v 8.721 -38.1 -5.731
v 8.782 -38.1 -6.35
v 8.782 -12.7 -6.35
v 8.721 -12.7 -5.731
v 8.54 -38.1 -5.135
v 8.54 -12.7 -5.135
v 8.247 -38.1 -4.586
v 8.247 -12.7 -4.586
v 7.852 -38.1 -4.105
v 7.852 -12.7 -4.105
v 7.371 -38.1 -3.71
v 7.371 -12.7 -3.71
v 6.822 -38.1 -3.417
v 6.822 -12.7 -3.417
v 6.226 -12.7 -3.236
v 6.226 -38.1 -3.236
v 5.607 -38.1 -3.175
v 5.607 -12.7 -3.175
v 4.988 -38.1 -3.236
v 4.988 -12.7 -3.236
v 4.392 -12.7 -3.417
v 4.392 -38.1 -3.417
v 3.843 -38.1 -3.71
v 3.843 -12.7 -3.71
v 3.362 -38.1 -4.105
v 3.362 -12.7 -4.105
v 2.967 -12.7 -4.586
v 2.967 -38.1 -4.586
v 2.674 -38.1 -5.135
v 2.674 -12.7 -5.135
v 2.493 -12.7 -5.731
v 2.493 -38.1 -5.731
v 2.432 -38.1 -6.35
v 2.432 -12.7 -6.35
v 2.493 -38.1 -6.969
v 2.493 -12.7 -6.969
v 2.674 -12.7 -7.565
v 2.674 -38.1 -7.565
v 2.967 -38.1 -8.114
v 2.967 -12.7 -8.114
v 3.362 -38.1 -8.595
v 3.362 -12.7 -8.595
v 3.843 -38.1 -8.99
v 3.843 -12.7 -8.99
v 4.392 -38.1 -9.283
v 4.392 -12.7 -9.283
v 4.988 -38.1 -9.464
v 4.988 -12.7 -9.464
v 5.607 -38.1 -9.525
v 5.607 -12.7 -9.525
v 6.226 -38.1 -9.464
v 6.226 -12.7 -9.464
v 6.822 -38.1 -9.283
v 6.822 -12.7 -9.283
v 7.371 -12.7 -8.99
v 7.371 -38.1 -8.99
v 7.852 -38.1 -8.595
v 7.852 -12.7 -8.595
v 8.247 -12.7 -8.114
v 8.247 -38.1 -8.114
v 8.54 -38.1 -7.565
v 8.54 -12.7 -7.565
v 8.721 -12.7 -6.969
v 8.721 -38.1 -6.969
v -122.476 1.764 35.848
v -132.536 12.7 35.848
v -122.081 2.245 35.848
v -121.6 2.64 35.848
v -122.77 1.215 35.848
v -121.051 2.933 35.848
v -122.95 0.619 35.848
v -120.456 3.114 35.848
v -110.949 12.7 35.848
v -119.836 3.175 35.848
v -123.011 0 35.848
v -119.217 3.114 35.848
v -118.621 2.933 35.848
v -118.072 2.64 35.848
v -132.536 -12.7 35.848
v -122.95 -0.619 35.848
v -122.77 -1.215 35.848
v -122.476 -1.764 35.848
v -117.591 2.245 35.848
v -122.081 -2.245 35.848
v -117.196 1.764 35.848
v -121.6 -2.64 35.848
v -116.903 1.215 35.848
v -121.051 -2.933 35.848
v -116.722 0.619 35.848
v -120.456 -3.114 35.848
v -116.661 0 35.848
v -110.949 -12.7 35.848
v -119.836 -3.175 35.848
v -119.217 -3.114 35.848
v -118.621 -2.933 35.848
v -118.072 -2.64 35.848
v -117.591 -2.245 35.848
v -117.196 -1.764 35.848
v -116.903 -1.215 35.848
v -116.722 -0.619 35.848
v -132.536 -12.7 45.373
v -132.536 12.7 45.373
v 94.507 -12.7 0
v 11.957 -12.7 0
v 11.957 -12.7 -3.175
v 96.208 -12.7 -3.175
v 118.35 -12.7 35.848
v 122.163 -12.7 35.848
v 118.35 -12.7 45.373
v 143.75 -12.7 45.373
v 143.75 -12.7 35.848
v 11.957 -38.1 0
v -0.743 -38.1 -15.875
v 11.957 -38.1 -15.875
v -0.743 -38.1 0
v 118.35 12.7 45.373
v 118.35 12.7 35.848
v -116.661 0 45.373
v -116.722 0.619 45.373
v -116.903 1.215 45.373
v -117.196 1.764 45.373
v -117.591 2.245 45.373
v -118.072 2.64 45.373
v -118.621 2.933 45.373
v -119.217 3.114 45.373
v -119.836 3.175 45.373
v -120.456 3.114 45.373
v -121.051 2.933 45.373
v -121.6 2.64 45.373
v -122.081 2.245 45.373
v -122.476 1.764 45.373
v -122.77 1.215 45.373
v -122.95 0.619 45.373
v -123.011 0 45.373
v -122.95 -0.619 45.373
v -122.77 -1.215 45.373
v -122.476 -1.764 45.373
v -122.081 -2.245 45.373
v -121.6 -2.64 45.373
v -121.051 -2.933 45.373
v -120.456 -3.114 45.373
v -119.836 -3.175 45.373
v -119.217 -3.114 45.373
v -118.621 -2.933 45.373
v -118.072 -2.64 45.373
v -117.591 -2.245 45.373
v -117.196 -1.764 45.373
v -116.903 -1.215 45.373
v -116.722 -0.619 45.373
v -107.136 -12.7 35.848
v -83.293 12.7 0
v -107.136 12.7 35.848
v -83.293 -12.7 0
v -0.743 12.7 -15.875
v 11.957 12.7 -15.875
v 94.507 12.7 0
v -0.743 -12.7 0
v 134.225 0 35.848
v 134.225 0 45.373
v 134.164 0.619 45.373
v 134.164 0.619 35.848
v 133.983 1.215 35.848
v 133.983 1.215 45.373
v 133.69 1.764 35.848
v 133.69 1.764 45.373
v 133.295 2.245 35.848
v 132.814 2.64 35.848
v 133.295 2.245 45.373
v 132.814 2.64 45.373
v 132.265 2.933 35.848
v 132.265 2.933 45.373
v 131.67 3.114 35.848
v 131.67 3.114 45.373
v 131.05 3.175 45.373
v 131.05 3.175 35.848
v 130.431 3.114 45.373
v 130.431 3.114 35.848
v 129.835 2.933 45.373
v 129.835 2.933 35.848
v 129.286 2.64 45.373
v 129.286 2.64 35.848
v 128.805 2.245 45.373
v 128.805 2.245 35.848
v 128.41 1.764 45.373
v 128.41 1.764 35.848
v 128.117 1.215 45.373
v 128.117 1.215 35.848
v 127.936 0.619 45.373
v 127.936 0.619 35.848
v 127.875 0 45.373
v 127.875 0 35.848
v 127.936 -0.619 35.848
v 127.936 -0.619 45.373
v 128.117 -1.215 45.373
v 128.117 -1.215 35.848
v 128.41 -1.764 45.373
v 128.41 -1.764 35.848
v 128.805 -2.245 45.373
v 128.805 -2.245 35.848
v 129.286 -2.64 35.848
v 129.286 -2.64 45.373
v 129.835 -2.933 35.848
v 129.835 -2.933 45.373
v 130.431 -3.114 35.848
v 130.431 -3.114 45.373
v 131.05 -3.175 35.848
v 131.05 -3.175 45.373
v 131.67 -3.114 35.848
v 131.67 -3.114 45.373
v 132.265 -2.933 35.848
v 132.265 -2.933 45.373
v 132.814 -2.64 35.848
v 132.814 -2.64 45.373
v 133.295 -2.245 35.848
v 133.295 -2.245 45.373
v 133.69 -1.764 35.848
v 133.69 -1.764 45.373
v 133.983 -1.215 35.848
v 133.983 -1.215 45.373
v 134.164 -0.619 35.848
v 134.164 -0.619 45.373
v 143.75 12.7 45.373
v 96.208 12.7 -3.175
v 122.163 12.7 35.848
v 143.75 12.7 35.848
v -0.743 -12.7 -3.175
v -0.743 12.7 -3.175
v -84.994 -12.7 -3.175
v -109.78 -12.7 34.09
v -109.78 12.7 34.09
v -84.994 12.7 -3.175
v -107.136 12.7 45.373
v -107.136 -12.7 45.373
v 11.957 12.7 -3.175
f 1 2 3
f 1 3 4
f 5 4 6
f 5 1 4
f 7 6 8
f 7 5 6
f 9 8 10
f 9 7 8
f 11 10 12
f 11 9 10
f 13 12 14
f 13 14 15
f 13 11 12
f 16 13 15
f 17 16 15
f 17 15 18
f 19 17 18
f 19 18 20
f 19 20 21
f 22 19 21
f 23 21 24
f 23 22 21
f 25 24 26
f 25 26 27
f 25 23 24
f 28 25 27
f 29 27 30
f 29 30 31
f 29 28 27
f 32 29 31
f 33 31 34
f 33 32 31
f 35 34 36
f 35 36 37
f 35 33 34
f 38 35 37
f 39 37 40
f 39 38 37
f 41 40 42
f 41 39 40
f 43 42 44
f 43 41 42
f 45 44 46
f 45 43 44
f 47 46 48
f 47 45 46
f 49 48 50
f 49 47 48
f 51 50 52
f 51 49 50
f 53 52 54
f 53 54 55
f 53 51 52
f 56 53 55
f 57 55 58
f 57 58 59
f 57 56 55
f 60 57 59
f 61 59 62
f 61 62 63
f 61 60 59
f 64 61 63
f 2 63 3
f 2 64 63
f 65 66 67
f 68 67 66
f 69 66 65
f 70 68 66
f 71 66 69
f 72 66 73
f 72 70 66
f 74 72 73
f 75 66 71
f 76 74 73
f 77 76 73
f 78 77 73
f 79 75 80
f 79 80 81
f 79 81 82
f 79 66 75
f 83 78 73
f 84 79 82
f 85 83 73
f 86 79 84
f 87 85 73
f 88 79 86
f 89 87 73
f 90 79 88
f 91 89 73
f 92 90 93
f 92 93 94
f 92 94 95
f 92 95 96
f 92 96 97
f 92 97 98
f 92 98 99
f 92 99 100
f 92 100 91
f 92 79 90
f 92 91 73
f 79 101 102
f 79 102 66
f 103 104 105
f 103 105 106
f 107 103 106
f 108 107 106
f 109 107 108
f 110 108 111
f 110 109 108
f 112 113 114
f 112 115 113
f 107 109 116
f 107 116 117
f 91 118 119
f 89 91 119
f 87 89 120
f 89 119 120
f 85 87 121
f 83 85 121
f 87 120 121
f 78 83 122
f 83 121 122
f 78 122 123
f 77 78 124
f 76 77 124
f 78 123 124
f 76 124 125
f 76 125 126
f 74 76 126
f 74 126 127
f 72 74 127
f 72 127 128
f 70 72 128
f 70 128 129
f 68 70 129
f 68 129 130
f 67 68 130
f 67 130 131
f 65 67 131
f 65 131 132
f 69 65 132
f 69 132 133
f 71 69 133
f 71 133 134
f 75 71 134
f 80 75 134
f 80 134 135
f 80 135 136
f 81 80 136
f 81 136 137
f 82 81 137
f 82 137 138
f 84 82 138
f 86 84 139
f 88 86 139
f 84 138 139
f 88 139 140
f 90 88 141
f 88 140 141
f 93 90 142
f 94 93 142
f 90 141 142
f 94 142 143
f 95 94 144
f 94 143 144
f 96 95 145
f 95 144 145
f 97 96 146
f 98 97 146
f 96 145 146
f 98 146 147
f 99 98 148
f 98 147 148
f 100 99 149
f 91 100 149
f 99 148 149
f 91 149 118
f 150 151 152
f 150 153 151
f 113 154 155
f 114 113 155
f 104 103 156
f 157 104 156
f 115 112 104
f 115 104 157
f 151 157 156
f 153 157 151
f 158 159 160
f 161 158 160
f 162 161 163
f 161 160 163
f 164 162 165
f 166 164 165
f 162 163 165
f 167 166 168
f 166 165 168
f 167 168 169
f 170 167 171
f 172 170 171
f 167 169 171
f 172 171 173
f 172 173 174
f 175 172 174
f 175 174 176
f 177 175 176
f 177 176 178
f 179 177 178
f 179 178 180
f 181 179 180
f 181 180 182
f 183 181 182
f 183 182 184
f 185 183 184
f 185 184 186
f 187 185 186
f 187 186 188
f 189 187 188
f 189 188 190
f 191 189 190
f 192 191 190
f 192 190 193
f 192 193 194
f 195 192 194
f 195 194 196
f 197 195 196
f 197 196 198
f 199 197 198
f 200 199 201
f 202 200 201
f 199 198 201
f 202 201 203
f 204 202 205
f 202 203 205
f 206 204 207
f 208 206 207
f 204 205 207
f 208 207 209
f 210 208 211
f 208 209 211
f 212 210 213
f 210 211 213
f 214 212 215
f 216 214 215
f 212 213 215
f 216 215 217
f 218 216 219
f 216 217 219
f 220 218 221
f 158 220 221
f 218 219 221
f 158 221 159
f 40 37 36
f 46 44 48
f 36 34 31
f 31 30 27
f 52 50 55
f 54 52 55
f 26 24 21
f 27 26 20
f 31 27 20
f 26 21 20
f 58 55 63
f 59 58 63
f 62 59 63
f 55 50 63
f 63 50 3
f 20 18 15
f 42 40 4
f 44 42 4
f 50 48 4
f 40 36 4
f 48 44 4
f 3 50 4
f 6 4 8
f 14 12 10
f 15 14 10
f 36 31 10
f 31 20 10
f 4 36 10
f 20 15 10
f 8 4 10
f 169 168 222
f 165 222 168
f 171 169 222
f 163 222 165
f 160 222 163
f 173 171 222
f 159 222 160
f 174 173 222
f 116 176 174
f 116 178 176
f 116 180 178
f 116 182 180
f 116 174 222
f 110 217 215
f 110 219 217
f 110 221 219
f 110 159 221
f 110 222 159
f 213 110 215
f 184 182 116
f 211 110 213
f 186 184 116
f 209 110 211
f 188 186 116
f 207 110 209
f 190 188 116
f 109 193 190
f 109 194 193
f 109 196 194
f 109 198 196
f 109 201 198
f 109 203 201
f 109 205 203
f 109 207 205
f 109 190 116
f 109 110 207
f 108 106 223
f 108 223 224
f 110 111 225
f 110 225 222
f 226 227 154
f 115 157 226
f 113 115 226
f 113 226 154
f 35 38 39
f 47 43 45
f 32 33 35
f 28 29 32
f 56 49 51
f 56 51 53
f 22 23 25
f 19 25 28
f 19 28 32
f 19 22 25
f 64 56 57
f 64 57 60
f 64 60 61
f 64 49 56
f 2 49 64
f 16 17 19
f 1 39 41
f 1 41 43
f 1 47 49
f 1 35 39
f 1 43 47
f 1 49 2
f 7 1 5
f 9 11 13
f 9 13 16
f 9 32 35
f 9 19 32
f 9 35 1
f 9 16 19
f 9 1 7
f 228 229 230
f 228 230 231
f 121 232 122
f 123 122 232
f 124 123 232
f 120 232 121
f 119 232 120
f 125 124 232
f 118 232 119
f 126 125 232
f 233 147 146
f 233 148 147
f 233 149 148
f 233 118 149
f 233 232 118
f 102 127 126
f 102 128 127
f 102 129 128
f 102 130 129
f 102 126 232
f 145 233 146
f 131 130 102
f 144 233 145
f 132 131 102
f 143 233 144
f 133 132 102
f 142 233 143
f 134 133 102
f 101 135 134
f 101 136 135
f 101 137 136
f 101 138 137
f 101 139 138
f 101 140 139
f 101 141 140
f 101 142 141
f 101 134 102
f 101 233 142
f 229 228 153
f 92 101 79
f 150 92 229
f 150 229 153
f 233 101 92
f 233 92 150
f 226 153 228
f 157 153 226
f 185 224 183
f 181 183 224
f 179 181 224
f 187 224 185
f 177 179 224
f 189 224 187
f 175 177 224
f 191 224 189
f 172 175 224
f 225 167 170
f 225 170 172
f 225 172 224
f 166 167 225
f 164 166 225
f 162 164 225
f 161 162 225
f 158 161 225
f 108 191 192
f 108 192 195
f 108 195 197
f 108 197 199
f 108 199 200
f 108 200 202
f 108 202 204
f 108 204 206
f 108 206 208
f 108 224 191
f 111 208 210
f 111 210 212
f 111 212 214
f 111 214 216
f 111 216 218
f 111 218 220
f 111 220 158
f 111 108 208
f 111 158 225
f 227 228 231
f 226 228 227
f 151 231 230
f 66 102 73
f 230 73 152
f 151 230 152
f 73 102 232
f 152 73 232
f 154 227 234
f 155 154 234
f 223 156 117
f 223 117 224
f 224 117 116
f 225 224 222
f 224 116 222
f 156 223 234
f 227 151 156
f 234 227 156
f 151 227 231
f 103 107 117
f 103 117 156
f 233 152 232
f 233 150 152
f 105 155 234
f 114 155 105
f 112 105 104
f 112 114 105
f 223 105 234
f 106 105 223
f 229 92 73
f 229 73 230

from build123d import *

# Parameters (mm, degrees)
F1_DEPTH = 12.7
F2_W     = 6.35
F2_H     = 12.7
F2_H_2   = 3.175
F3_DEPTH = 25.4
F4_R     = 3.175
F5_DEPTH = 25.4
F6_R     = 3.175
F7_DEPTH = 25.4
F8_R     = 3.175
F9_DEPTH = 25.4


# Not quite as in the source:
# - a feature names something its author has since deleted; it is built from what else it names


with BuildPart() as f1:
    # F0 (on Front) → F1 (new body, symmetric)
    with BuildSketch(Plane.XZ):
        Polygon((-110.9493968193, 35.8484322961), (-107.1362588495, 35.8484322961), (-107.1362588495, 45.3734322961), (-132.5362588495, 45.3734322961), (-132.5362588495, 35.8484322961), align=None)
        Polygon((94.5069370505, 0), (-83.2930629495, 0), (-107.1362588495, 35.8484322961), (-110.9493968193, 35.8484322961), (-109.7799148305, 34.090106941), (-84.9944726753, -3.175), (96.2083467763, -3.175), (122.1632709203, 35.8484322961), (118.3501329505, 35.8484322961), align=None)
        Polygon((118.3501329505, 45.3734322961), (118.3501329505, 35.8484322961), (122.1632709203, 35.8484322961), (128.4984556522, 45.3734322961), align=None)
        Polygon((128.4984556522, 45.3734322961), (122.1632709203, 35.8484322961), (143.7501329505, 35.8484322961), (143.7501329505, 45.3734322961), align=None)
    extrude(amount=F1_DEPTH, both=True)

    # F2 (on face) → F3 (join, symmetric)
    with BuildSketch(Plane.XZ.offset(12.7)):
        with Locations((2.4319370505, -9.525)):
            Rectangle(F2_W, F2_H)
        with Locations((8.7819370505, -9.525)):
            Rectangle(F2_W, F2_H)
        with Locations((8.7819370505, -1.5875)):
            Rectangle(F2_W, F2_H_2)
        Polygon((5.6069370505, -3.175), (5.6069370505, 0), (0, 0), (-0.7430629495, 0), (-0.7430629495, -3.175), align=None)
    extrude(amount=F3_DEPTH, both=True)

    # F6 (on face) → F7 (cut)
    with BuildSketch(Plane.XY.offset(45.3734322961)):
        with Locations((131.0501329505, 0)):
            Circle(F6_R)
    extrude(amount=-F7_DEPTH, mode=Mode.SUBTRACT)

    # F8 (on face) → F9 (cut)
    with BuildSketch(Plane.XY.offset(45.3734322961)):
        with Locations((-119.8362588495, 0)):
            Circle(F8_R)
    extrude(amount=-F9_DEPTH, mode=Mode.SUBTRACT)


with BuildPart() as f5:
    # F4 (on face) → F5 (new body)
    with BuildSketch(Plane.XZ.offset(38.1)):
        with Locations((5.6069370505, -6.35)):
            Circle(F4_R)
    extrude(amount=-F5_DEPTH)


solid = Compound([f1.part, f5.part])
